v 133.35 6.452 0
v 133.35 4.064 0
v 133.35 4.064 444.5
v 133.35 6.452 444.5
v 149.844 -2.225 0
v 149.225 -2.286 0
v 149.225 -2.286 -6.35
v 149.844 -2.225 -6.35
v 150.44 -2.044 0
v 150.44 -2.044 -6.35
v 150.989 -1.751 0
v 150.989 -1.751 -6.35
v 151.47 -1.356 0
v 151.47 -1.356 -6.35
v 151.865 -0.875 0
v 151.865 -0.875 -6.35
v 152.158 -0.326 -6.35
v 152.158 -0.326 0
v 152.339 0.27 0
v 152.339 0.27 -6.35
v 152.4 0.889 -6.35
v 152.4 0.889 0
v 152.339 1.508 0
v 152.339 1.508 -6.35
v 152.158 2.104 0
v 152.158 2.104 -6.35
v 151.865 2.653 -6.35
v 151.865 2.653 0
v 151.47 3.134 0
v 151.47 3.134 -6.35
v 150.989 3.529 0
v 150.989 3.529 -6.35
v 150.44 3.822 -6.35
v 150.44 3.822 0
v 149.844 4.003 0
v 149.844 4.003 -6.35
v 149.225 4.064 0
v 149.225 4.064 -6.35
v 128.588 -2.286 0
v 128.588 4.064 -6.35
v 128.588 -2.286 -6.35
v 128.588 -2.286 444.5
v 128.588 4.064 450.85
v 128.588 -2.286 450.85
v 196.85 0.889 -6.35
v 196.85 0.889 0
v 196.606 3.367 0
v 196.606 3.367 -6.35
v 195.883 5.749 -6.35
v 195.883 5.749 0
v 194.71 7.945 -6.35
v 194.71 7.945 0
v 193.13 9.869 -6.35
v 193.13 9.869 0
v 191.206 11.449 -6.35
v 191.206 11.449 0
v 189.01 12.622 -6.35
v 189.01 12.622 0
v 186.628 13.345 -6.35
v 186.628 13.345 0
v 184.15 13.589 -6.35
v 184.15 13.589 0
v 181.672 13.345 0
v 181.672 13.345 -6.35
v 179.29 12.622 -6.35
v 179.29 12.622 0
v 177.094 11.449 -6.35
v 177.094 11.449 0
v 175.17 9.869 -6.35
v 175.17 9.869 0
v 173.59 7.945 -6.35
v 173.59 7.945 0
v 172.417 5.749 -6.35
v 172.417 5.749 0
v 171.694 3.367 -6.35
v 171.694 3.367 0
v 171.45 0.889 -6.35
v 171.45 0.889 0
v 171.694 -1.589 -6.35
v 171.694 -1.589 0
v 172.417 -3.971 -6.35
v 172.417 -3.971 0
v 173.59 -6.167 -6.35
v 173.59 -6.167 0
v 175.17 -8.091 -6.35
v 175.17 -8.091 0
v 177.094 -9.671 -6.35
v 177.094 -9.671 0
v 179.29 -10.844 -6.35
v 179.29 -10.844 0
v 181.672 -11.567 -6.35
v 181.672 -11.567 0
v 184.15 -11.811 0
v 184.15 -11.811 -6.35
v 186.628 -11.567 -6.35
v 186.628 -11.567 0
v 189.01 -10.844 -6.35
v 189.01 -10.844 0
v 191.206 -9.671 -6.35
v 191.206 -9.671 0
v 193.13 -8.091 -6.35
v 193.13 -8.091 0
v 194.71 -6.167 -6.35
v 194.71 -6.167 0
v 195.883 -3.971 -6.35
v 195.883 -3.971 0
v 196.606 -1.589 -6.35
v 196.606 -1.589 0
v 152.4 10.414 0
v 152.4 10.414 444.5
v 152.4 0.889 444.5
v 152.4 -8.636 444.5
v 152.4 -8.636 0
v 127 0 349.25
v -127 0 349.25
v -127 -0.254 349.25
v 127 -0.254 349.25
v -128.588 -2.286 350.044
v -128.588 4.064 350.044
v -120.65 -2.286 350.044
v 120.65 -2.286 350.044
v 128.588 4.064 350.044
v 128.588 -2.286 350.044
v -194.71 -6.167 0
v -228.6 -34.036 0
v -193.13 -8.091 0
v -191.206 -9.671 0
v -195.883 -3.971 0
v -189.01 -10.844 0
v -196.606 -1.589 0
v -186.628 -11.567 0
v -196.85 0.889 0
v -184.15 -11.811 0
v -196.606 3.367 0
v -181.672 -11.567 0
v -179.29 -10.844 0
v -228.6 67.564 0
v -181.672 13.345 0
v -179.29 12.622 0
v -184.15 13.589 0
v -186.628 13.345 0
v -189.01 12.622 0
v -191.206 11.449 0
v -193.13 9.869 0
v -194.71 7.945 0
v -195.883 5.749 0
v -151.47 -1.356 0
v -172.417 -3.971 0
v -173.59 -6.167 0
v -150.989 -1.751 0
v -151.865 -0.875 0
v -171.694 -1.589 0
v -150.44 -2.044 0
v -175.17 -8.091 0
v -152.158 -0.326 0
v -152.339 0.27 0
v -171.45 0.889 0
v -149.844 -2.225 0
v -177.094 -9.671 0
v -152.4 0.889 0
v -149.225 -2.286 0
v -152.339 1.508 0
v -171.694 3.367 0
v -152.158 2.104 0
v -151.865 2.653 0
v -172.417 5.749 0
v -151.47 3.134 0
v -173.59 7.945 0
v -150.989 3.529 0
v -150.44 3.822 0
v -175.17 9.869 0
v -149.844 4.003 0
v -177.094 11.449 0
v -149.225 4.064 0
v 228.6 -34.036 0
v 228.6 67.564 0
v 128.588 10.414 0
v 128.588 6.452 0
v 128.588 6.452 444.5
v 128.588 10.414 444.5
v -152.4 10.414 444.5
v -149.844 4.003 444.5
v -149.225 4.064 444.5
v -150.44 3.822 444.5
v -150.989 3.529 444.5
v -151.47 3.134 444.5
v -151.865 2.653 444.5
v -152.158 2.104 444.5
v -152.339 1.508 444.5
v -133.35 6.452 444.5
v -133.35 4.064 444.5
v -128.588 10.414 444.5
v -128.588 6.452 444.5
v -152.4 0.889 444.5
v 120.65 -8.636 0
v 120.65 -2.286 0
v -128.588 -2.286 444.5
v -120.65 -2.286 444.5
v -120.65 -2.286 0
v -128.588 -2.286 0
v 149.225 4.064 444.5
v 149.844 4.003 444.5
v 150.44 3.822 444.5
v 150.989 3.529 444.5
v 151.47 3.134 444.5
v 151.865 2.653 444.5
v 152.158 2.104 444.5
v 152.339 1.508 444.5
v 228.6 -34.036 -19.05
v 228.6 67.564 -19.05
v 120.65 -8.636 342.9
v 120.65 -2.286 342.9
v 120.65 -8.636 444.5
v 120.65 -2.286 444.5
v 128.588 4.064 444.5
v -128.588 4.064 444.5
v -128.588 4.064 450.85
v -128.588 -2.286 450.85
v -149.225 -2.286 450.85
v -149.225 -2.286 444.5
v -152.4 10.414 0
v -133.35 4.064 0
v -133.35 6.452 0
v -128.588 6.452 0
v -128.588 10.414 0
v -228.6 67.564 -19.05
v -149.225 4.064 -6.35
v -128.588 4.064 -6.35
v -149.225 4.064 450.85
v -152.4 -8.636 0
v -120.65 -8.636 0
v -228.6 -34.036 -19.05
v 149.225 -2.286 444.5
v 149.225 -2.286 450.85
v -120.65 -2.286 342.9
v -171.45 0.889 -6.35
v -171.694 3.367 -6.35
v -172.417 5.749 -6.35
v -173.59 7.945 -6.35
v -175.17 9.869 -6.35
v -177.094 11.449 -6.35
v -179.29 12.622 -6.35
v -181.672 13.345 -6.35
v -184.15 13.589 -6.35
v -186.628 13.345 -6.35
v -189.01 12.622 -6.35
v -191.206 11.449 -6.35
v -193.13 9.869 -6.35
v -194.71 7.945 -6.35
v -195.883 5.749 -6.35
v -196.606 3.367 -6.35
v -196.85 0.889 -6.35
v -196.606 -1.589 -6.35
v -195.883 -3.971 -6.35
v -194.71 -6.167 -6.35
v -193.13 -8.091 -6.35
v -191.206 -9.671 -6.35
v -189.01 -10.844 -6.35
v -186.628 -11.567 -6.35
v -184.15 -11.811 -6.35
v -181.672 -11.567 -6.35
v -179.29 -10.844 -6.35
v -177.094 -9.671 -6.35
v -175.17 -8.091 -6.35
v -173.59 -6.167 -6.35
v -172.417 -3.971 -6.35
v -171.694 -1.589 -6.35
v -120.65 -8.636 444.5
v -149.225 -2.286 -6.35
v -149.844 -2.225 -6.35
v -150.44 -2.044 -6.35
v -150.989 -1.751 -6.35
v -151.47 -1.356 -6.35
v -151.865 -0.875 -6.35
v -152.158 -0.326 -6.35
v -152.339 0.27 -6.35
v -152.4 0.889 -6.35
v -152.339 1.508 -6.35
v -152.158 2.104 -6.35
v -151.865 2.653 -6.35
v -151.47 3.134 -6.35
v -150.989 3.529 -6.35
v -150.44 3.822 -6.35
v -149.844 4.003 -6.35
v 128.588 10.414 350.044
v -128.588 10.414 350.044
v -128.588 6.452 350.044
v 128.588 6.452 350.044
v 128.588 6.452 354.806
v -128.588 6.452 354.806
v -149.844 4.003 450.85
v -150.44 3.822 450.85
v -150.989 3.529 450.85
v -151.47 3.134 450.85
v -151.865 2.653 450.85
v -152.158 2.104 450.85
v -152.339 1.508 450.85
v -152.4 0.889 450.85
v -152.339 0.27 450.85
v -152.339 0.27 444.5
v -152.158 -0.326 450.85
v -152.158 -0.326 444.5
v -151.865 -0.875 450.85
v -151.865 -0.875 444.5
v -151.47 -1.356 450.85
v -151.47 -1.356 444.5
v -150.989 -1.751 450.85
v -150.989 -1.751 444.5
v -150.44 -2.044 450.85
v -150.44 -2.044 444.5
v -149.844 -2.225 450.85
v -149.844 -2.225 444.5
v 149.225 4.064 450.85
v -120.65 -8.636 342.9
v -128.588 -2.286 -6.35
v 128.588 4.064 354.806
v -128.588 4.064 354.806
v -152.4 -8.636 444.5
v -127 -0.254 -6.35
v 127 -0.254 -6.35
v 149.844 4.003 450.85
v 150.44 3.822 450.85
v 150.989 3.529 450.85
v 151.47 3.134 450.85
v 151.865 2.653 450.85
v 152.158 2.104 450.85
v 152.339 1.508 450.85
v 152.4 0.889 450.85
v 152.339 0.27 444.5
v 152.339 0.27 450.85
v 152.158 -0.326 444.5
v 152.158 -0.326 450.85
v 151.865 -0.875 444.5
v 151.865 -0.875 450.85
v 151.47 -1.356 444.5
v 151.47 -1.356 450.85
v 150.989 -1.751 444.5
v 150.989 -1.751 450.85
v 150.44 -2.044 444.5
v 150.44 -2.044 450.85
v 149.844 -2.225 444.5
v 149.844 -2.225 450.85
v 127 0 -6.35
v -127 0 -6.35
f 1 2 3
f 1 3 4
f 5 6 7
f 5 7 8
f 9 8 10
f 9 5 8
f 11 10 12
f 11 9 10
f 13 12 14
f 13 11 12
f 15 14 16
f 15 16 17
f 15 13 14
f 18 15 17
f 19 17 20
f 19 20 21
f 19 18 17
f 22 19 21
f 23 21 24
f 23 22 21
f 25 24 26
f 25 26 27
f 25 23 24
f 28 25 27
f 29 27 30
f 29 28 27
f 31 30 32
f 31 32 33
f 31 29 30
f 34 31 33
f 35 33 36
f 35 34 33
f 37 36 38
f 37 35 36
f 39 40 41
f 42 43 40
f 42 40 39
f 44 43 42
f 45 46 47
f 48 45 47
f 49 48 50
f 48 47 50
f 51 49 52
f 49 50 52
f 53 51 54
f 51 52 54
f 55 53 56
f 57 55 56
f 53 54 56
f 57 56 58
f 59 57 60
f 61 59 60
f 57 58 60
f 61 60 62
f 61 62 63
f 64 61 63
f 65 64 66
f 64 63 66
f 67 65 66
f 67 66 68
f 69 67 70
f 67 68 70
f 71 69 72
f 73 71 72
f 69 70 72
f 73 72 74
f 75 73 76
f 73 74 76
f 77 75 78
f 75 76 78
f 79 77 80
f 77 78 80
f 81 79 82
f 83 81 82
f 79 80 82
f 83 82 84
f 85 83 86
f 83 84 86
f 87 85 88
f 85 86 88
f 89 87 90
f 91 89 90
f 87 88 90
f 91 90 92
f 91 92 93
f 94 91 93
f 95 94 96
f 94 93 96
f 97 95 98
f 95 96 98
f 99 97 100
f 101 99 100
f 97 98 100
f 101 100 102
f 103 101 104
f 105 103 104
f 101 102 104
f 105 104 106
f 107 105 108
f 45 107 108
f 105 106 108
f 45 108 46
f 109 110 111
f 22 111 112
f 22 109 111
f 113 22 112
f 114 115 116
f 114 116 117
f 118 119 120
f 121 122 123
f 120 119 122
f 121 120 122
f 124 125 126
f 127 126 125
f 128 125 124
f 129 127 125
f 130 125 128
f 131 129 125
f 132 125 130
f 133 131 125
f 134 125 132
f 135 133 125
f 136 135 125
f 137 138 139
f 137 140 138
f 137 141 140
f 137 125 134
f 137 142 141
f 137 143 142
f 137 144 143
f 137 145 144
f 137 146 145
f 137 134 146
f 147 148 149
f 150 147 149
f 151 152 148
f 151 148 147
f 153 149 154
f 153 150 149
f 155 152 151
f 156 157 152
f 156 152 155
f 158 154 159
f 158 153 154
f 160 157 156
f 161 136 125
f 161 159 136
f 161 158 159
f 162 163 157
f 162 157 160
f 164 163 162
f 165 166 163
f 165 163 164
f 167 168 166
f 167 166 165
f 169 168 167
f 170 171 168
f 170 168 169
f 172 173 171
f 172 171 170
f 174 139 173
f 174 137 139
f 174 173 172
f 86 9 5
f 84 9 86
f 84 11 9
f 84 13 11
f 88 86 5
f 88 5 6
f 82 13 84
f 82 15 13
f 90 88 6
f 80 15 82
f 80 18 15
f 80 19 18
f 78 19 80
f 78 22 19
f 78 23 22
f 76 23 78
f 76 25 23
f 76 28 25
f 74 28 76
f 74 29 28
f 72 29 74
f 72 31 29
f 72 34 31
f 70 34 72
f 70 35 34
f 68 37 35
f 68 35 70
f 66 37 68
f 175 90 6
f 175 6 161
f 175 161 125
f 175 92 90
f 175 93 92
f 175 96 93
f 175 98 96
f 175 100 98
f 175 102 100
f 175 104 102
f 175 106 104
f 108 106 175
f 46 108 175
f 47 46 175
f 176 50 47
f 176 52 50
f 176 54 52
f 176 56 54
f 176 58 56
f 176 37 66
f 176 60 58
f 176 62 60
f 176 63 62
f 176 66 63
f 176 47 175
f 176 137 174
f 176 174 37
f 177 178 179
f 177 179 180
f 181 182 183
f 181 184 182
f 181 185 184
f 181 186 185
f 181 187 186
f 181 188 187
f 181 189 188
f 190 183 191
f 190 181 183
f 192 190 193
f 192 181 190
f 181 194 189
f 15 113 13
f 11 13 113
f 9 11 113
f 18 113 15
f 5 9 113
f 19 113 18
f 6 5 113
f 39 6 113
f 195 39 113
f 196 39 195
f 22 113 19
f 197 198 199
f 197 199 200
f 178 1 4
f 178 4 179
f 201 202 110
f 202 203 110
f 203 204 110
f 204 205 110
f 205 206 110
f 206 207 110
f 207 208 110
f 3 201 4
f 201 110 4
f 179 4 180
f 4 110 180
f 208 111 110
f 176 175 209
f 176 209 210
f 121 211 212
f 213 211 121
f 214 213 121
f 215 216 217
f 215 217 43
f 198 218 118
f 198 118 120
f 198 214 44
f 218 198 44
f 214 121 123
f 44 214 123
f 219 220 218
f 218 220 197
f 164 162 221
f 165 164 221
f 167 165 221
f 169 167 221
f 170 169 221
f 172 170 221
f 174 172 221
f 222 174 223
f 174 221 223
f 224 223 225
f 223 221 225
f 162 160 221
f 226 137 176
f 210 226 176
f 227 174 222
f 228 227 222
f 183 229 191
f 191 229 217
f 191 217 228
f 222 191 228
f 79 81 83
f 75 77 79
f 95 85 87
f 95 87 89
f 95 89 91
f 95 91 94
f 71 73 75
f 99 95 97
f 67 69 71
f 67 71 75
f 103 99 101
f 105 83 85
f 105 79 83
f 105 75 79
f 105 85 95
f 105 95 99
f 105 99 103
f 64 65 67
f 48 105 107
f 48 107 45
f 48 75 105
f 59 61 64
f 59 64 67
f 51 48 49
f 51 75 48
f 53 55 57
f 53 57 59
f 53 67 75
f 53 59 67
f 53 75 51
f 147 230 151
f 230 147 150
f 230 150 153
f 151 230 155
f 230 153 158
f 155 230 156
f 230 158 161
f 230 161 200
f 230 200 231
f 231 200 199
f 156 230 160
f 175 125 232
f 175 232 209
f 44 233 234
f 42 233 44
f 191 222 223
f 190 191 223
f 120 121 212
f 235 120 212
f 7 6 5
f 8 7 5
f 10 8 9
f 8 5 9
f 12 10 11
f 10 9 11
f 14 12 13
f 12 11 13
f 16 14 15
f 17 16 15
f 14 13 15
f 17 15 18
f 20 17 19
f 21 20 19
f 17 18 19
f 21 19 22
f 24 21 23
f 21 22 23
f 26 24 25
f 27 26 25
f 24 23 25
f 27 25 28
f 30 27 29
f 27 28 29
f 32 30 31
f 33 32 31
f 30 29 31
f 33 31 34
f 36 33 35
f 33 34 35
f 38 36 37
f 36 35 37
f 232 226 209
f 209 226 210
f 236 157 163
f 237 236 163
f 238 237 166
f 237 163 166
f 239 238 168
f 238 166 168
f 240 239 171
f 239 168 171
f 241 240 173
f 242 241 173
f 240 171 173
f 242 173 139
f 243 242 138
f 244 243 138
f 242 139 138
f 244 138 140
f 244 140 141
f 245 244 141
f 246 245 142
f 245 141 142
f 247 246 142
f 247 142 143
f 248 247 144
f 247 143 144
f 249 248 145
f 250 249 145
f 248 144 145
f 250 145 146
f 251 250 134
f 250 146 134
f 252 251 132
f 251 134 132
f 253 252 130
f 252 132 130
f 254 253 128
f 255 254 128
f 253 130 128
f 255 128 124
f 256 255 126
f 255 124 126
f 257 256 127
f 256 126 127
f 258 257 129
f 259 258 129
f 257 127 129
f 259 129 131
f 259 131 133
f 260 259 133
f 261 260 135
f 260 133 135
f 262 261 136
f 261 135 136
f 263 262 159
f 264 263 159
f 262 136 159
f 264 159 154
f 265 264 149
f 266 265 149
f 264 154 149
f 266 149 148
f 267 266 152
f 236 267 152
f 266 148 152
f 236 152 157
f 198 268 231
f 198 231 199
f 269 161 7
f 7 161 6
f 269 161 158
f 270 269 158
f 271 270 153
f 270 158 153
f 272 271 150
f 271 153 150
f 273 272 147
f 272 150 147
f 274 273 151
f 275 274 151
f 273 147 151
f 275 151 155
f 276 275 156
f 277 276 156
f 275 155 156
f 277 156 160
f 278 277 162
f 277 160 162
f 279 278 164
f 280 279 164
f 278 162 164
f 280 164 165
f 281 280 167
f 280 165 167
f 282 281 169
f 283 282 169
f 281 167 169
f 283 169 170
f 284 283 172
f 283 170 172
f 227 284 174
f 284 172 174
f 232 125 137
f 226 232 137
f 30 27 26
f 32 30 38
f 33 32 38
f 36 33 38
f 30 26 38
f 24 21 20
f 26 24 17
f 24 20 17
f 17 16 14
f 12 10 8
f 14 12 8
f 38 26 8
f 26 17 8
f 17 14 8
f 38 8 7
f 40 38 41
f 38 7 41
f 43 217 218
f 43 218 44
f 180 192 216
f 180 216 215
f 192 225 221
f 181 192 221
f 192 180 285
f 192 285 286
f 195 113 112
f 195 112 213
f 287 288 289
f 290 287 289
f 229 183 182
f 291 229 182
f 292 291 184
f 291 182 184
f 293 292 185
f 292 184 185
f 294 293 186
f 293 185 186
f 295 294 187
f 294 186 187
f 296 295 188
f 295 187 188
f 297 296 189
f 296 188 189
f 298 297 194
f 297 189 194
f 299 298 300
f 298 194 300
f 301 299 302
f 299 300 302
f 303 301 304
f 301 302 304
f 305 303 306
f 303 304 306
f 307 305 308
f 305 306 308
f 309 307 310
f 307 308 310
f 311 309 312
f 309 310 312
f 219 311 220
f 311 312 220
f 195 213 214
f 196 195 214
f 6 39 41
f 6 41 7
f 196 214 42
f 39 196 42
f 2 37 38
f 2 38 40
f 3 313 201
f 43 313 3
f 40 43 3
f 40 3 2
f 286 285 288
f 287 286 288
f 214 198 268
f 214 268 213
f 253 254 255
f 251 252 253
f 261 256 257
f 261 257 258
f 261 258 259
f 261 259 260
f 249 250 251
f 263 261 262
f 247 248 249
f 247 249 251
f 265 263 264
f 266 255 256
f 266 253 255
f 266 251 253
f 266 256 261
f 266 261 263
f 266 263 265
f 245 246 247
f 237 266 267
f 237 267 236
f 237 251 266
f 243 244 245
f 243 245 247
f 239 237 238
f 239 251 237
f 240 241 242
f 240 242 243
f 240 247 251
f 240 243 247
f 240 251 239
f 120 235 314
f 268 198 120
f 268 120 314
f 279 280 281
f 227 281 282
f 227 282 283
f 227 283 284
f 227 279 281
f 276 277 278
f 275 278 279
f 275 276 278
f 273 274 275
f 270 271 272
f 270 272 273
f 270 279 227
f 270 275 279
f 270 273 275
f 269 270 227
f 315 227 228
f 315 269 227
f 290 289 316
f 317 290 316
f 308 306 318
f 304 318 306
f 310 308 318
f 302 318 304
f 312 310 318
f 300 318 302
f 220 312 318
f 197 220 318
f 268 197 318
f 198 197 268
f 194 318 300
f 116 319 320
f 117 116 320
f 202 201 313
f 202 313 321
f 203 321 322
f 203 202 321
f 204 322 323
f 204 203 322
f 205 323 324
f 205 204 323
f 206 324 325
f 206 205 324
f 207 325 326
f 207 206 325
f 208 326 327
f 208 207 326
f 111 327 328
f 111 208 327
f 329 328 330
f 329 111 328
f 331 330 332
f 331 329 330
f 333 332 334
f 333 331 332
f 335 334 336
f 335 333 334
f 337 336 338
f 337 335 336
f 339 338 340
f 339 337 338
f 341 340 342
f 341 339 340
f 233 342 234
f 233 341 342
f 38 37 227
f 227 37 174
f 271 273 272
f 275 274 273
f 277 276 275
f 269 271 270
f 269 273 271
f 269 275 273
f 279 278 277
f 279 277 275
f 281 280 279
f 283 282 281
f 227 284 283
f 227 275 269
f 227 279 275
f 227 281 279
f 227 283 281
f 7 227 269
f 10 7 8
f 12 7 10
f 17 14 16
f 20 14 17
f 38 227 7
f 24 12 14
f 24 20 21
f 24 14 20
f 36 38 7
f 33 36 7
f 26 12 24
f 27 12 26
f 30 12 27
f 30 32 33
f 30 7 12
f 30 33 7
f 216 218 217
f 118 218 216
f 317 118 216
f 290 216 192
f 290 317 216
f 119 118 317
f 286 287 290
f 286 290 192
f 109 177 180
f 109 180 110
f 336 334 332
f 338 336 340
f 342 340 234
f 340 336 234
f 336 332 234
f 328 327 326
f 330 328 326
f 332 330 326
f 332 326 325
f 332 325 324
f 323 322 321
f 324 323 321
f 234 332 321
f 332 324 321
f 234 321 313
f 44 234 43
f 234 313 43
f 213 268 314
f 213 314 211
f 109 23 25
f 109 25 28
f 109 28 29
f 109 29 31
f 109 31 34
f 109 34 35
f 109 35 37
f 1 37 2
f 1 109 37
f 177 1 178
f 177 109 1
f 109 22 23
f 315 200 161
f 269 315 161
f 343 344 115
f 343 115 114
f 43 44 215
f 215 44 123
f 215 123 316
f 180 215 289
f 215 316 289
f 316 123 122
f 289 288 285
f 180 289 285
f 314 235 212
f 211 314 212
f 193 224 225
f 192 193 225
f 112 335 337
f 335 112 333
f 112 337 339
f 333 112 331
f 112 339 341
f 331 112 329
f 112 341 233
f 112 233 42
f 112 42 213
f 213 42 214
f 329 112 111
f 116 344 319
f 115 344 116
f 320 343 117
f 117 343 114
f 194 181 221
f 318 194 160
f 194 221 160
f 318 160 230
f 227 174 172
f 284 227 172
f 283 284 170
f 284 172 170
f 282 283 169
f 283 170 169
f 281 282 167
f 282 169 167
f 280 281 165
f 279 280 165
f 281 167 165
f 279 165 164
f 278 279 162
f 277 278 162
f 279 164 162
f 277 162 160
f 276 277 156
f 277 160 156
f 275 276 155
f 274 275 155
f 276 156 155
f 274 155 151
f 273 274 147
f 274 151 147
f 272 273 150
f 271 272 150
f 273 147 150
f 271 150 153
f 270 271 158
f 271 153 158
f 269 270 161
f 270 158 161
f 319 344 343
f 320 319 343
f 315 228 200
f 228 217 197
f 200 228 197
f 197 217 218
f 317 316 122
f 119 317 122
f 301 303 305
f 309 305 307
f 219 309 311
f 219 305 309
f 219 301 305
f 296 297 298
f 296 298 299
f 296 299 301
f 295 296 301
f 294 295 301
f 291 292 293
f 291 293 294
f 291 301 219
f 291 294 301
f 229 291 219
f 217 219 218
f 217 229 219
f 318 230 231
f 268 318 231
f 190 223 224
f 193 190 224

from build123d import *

# Parameters (mm, degrees)
F0_W           = 254
F0_H           = 355.6
F1_DEPTH       = 0.254
F3_DEPTH       = 444.5
F6_DEPTH       = 6.35
F8_DEPTH       = 6.35
F11_DEPTH      = 101.6
F13_DEPTH      = 128.5875
F13_DEPTH_BACK = 128.5875
F14_W          = 257.175
F14_H          = 6.35
F15_DEPTH      = 6.35
F17_W          = 457.2
F17_H          = 101.6
F18_DEPTH      = 19.05
F19_R          = 12.7
F20_DEPTH      = 6.35
F22_DEPTH      = 6.35


with BuildPart() as f1:
    # F0 (on Front) → F1 (new body)
    with BuildSketch(Plane.XZ):
        with Locations((0, 171.45)):
            Rectangle(F0_W, F0_H)
    extrude(amount=F1_DEPTH)


with BuildPart() as f3:
    # F2 (on Top) → F3 (new body)
    with BuildSketch(Plane.XY):
        Polygon((-120.65, -2.286), (-128.5875, -2.286), (-128.5875, 4.064), (-133.35, 4.064), (-133.35, 6.4516), (-128.5875, 6.4516), (-128.5875, 10.414), (-152.4, 10.414), (-152.4, -8.636), (-120.65, -8.636), align=None)
    extrude(amount=F3_DEPTH)


with BuildPart() as f4_1:
    # F4: instance of F3
    add(f3.part.mirror(Plane.YZ))


with BuildPart() as f3_1:
    add(f3.part)

    # F5 (on face) → F6 (join)
    with BuildSketch(Plane.XY.offset(444.5)):
        with BuildLine():
            Line((-128.5875, -2.286), (-128.5875, 4.064))
            Line((-128.5875, 4.064), (-149.225, 4.064))
            ThreePointArc((-149.225, 4.064), (-152.4, 0.889), (-149.225, -2.286))
            Line((-149.225, -2.286), (-128.5875, -2.286))
        make_face()
    extrude(amount=F6_DEPTH)

    # F7 (on face) → F8 (join)
    with BuildSketch(Plane(origin=(0, 0, 0), x_dir=(1, 0, 0), z_dir=(0, 0, -1))):
        with BuildLine():
            Line((-128.5875, -4.064), (-128.5875, 2.286))
            Line((-128.5875, 2.286), (-149.225, 2.286))
            ThreePointArc((-149.225, 2.286), (-152.4, -0.889), (-149.225, -4.064))
            Line((-149.225, -4.064), (-128.5875, -4.064))
        make_face()
    extrude(amount=F8_DEPTH)


with BuildPart() as f11:
    # F10 (on face) → F11 (new body)
    with BuildSketch(Plane.XY.offset(444.5)):
        Polygon((-128.5875, 10.414), (-128.5875, -2.286), (-120.65, -2.286), (-120.65, -8.636), (0, -8.636), (120.65, -8.636), (120.65, -2.286), (128.5875, -2.286), (128.5875, 10.414), (0, 10.414), align=None)
    extrude(amount=-F11_DEPTH)

    # F12 (on Right) → F13 (cut, two sides)
    with BuildSketch(Plane.YZ) as f13_sk:
        Polygon((-2.286, 350.04375), (-2.286, 342.10625), (11.20775, 342.10625), (11.20775, 350.04375), (6.4516, 350.04375), (6.4516, 354.80625), (4.064, 354.80625), (4.064, 350.04375), align=None)
    extrude(amount=-F13_DEPTH, mode=Mode.SUBTRACT)
    extrude(f13_sk.sketch, amount=F13_DEPTH_BACK, mode=Mode.SUBTRACT)

    # F14 (on face) → F15 (join)
    with BuildSketch(Plane.XY.offset(444.5)):
        with Locations((0, 0.889)):
            Rectangle(F14_W, F14_H)
    extrude(amount=F15_DEPTH)


with BuildPart() as f16_1:
    # F16: instance of F3
    add(f3_1.part.mirror(Plane.YZ))


with BuildPart() as f18:
    # F17 (on Top) → F18 (new body)
    with BuildSketch(Plane.XY):
        with Locations((0, 16.764)):
            Rectangle(F17_W, F17_H)
    extrude(amount=-F18_DEPTH)

    # F19 (on face) → F20 (cut)
    with BuildSketch(Plane.XY):
        with Locations((-184.15, 0.889)):
            Circle(F19_R)
        with Locations((184.15, 0.889)):
            Circle(F19_R)
    extrude(amount=-F20_DEPTH, mode=Mode.SUBTRACT)

    # F21 (on face) → F22 (cut)
    with BuildSketch(Plane.XY):
        with BuildLine():
            Line((0, 4.064), (-149.225, 4.064))
            ThreePointArc((-149.225, 4.064), (-152.4, 0.889), (-149.225, -2.286))
            Line((-149.225, -2.286), (0, -2.286))
            Line((0, -2.286), (149.225, -2.286))
            ThreePointArc((149.225, -2.286), (152.4, 0.889), (149.225, 4.064))
            Line((149.225, 4.064), (0, 4.064))
        make_face()
    extrude(amount=-F22_DEPTH, mode=Mode.SUBTRACT)


solid = Compound([f1.part, f3_1.part, f11.part, f16_1.part, f18.part])
